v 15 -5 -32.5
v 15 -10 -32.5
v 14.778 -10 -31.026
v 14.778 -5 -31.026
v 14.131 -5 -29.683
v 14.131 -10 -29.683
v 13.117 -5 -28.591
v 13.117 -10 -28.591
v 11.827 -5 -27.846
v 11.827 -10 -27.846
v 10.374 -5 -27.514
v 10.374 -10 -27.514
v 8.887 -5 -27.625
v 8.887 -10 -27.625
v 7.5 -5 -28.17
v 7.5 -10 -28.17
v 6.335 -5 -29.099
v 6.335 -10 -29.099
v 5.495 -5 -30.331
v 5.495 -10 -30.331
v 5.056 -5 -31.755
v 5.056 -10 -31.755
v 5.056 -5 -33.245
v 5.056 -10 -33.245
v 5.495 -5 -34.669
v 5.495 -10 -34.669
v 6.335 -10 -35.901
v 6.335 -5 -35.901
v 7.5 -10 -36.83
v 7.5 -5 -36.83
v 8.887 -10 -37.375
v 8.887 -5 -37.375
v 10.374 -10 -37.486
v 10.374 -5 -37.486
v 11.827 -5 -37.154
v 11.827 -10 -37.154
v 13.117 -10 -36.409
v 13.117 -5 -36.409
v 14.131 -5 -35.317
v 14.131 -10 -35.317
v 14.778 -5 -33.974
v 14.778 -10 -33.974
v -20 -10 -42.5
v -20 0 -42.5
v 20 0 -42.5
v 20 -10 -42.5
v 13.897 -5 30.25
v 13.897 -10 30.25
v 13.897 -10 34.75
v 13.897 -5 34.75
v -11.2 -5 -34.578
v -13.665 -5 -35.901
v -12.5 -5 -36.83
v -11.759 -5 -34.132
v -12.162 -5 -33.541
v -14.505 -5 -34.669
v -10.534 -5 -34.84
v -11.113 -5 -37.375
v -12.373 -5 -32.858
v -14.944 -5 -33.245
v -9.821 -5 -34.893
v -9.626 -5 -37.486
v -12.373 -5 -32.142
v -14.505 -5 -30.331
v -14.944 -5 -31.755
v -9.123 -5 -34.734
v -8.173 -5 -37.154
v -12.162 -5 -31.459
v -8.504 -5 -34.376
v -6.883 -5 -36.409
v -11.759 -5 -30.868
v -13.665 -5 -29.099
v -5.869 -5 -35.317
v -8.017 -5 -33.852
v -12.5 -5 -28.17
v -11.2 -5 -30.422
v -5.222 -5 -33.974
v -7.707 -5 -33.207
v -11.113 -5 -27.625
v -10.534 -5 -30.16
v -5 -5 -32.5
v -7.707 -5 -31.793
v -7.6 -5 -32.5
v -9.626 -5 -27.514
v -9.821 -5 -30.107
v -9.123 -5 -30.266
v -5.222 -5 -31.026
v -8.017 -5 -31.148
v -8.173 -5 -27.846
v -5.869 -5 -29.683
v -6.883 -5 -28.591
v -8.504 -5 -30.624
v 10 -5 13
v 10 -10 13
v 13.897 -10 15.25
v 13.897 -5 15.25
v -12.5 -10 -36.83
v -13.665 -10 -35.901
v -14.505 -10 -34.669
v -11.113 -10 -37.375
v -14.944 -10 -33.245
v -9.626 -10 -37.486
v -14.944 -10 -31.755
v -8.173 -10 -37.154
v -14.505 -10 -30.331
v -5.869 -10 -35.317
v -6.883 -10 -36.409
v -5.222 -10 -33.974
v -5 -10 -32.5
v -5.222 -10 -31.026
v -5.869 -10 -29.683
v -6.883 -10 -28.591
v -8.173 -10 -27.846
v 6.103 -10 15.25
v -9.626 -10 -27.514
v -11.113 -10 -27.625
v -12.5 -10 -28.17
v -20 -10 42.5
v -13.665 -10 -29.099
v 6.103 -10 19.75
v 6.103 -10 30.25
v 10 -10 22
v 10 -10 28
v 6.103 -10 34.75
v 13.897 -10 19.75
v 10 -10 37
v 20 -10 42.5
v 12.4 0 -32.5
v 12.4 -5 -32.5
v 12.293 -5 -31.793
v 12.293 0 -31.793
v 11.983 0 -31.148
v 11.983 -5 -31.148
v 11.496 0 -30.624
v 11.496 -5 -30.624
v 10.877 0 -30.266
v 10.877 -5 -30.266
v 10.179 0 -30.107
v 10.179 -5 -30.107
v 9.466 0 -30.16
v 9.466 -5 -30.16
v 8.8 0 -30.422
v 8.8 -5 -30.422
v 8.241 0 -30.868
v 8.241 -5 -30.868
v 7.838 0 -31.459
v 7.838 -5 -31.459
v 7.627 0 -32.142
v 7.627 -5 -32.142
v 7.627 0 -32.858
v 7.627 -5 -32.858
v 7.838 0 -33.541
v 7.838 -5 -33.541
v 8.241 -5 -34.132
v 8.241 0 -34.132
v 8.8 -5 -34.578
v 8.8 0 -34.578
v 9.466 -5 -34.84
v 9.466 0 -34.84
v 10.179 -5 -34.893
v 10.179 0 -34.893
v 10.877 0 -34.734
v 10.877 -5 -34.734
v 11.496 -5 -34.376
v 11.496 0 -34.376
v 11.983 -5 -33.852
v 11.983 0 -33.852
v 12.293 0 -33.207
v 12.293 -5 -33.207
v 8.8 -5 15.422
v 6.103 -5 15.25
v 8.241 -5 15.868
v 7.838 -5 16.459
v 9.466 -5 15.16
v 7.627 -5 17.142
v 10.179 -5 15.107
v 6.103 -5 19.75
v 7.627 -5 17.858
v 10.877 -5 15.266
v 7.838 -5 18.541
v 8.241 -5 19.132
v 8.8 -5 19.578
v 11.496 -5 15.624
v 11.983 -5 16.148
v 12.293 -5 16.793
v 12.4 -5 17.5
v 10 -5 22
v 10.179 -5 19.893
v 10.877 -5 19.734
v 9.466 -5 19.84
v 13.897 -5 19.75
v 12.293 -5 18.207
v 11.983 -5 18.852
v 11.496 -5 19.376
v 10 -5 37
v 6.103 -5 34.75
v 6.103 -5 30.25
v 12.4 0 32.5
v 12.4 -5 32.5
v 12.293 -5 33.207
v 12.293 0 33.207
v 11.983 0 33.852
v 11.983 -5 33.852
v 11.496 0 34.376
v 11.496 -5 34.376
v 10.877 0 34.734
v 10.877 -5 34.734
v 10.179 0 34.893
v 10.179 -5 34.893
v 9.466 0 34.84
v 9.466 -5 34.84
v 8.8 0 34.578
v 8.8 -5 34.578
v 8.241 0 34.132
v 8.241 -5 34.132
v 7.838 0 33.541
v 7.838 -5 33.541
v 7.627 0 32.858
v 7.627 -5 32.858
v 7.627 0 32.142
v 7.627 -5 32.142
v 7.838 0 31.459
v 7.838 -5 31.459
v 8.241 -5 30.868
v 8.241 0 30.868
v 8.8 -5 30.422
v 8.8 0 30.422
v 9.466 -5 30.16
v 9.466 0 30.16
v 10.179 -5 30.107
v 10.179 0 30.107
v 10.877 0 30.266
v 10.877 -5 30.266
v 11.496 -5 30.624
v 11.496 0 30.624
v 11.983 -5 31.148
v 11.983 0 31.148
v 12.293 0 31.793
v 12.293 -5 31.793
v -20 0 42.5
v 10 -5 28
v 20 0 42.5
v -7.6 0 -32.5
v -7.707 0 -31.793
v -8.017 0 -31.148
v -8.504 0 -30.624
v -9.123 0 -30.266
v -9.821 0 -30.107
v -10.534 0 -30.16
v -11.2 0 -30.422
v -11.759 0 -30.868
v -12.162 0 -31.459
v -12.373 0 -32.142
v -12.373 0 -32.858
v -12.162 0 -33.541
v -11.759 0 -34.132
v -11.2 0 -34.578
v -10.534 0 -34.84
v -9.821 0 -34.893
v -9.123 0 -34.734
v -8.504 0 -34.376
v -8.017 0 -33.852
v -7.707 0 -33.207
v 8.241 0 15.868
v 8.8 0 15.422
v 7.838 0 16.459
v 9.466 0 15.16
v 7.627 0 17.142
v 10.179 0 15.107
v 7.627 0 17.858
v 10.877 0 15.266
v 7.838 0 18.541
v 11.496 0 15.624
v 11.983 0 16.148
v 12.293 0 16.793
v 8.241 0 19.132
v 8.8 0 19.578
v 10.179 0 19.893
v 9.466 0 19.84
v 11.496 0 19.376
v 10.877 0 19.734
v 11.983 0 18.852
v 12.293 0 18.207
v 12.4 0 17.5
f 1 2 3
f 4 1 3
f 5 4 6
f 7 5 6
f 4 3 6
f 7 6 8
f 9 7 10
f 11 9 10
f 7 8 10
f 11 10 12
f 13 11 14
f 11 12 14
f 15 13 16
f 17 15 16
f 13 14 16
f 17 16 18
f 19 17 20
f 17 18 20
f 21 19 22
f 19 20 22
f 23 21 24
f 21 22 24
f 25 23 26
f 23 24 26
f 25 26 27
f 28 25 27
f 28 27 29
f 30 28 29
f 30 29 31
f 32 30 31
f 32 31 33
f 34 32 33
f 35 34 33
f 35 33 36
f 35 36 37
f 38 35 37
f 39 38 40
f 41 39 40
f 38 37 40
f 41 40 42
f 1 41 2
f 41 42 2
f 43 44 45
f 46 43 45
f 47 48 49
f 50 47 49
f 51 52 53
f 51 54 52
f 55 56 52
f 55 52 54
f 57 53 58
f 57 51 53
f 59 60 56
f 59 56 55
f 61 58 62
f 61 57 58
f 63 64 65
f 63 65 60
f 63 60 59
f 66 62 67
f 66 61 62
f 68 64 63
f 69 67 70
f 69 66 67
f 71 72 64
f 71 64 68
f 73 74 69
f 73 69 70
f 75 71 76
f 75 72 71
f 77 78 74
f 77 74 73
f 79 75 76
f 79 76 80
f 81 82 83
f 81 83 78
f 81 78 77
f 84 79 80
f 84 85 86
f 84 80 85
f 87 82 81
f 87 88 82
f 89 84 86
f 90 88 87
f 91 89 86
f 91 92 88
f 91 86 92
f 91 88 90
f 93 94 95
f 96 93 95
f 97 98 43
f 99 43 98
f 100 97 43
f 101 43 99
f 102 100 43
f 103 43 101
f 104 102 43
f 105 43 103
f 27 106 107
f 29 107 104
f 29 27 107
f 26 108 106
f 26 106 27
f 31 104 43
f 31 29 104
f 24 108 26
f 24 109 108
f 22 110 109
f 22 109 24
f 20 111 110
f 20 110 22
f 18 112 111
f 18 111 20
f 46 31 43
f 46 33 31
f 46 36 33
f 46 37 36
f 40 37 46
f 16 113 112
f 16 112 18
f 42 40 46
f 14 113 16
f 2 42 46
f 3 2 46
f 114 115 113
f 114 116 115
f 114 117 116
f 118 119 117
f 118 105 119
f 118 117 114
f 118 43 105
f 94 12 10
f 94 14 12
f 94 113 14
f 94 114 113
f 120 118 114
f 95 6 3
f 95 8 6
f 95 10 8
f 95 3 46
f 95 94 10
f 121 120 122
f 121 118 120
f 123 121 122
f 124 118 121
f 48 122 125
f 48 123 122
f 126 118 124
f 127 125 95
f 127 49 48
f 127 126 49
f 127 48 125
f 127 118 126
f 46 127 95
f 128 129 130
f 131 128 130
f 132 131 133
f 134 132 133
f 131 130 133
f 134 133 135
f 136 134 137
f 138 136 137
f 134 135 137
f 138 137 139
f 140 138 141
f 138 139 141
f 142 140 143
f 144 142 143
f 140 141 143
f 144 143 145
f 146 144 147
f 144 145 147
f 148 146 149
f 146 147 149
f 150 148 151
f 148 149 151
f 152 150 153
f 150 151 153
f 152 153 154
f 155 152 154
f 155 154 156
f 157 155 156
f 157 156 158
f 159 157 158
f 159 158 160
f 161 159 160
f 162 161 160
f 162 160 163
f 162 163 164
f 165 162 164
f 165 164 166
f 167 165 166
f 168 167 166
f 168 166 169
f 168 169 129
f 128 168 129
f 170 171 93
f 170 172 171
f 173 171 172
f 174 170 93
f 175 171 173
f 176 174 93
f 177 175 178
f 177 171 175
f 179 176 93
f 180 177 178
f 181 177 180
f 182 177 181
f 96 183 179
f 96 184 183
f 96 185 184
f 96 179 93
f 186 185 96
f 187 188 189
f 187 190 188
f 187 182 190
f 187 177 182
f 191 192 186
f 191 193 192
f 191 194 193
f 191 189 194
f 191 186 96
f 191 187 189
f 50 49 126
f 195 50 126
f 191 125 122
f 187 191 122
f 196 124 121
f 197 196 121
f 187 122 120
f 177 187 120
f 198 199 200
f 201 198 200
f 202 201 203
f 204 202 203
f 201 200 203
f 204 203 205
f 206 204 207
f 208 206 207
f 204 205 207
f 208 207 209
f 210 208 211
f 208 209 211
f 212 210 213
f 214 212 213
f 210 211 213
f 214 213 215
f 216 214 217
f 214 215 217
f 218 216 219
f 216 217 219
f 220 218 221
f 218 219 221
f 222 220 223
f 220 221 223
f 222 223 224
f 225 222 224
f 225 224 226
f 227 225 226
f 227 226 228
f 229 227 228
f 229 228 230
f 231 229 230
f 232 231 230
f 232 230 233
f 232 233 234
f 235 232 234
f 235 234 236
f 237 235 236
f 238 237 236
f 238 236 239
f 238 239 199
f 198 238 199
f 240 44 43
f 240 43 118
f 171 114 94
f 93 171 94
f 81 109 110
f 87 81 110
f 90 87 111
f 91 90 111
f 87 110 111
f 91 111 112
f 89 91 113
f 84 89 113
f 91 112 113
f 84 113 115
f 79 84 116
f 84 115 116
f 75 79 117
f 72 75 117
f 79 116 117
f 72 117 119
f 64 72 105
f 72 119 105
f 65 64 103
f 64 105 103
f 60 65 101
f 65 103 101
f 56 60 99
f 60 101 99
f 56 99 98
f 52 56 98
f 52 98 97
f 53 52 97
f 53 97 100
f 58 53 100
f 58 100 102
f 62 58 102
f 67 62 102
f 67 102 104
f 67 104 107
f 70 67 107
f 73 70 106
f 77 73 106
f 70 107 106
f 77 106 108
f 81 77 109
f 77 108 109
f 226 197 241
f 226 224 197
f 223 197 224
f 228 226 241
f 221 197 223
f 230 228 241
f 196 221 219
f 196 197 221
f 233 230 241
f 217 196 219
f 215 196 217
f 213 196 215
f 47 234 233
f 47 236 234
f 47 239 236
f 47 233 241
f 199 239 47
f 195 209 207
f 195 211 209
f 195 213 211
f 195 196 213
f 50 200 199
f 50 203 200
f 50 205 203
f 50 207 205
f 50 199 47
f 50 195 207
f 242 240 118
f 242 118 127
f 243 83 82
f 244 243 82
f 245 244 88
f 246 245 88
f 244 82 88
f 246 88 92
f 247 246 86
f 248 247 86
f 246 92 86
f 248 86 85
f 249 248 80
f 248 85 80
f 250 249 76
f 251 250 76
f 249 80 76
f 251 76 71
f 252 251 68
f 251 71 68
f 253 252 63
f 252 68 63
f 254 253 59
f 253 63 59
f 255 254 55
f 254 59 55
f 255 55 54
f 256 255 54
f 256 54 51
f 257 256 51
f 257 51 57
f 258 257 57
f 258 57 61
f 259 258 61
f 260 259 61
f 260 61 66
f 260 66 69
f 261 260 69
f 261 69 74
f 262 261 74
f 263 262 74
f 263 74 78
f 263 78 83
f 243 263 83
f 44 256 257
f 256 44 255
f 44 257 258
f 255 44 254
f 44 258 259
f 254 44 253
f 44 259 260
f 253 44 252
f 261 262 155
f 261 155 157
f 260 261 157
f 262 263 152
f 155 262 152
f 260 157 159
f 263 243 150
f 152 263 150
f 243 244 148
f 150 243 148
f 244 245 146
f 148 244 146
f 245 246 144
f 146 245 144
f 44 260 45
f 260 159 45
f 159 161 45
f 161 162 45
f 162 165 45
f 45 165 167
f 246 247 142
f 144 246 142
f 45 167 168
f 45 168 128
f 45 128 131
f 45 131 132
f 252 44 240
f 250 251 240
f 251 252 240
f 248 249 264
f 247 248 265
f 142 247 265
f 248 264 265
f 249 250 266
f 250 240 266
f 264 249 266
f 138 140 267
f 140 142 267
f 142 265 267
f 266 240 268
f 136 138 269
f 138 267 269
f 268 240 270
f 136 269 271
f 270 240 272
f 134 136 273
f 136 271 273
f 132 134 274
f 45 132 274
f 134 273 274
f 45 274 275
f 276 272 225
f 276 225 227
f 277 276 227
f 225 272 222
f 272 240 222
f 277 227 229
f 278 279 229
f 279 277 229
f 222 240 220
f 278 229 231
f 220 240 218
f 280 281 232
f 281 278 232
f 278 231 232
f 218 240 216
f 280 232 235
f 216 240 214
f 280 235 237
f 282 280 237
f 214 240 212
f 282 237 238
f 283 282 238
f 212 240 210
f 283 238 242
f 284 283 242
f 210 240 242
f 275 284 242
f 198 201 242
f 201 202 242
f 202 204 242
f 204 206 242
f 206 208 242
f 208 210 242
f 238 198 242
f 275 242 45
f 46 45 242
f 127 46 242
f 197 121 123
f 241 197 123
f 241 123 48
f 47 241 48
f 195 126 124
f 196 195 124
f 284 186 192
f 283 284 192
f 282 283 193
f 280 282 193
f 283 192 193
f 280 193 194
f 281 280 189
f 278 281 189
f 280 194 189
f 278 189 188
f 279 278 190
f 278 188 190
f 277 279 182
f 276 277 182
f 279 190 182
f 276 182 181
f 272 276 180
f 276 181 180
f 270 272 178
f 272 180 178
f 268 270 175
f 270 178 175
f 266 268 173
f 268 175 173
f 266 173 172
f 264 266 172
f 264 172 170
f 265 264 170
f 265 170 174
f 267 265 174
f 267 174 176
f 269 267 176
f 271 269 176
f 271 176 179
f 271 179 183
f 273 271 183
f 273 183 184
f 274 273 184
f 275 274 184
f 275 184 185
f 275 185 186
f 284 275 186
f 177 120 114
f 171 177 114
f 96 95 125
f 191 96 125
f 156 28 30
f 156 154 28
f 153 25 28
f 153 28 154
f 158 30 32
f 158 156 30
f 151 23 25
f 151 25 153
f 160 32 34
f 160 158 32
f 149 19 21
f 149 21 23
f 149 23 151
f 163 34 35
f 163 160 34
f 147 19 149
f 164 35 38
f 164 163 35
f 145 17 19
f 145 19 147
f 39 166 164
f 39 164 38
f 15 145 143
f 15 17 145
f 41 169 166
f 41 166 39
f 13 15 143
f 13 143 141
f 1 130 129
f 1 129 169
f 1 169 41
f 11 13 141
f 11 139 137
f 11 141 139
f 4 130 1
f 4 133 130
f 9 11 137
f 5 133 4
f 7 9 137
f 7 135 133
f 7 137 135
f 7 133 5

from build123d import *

# Parameters (mm, degrees)
SKETCH_W        = 40
SKETCH_H        = 85
PAD_DEPTH       = 10
SKETCH001_R     = 2.4
POCKET_DEPTH    = 10
SKETCH002_R     = 5
POCKET001_DEPTH = 5


with BuildPart() as part:
    # Sketch → Pad (new body)
    with BuildSketch(Plane.XZ):
        Rectangle(SKETCH_W, SKETCH_H)
    extrude(amount=PAD_DEPTH)

    # Sketch001 (on Face6 of Pad) → Pocket (cut)
    with BuildSketch(Plane.XZ.offset(10)):
        with Locations((-10, -32.5)):
            Circle(SKETCH001_R)
        with Locations((10, -32.5)):
            Circle(SKETCH001_R)
        with Locations((10, 32.5)):
            Circle(SKETCH001_R)
        with Locations((10, 17.5)):
            Circle(SKETCH001_R)
    extrude(amount=-POCKET_DEPTH, mode=Mode.SUBTRACT)

    # Sketch002 (on Face5 of Pocket) → Pocket001 (cut)
    with BuildSketch(Plane.XZ.offset(10)):
        with Locations((-10, -32.5)):
            Circle(SKETCH002_R)
        with Locations((10, -32.5)):
            Circle(SKETCH002_R)
        Polygon((13.897114, 30.25), (13.897114, 34.75), (10, 37), (6.102886, 34.75), (6.102886, 30.25), (10, 28), align=None)
        Polygon((13.897114, 15.25), (13.897114, 19.75), (10, 22), (6.102886, 19.75), (6.102886, 15.25), (10, 13), align=None)
    extrude(amount=-POCKET001_DEPTH, mode=Mode.SUBTRACT)


solid = part.part
